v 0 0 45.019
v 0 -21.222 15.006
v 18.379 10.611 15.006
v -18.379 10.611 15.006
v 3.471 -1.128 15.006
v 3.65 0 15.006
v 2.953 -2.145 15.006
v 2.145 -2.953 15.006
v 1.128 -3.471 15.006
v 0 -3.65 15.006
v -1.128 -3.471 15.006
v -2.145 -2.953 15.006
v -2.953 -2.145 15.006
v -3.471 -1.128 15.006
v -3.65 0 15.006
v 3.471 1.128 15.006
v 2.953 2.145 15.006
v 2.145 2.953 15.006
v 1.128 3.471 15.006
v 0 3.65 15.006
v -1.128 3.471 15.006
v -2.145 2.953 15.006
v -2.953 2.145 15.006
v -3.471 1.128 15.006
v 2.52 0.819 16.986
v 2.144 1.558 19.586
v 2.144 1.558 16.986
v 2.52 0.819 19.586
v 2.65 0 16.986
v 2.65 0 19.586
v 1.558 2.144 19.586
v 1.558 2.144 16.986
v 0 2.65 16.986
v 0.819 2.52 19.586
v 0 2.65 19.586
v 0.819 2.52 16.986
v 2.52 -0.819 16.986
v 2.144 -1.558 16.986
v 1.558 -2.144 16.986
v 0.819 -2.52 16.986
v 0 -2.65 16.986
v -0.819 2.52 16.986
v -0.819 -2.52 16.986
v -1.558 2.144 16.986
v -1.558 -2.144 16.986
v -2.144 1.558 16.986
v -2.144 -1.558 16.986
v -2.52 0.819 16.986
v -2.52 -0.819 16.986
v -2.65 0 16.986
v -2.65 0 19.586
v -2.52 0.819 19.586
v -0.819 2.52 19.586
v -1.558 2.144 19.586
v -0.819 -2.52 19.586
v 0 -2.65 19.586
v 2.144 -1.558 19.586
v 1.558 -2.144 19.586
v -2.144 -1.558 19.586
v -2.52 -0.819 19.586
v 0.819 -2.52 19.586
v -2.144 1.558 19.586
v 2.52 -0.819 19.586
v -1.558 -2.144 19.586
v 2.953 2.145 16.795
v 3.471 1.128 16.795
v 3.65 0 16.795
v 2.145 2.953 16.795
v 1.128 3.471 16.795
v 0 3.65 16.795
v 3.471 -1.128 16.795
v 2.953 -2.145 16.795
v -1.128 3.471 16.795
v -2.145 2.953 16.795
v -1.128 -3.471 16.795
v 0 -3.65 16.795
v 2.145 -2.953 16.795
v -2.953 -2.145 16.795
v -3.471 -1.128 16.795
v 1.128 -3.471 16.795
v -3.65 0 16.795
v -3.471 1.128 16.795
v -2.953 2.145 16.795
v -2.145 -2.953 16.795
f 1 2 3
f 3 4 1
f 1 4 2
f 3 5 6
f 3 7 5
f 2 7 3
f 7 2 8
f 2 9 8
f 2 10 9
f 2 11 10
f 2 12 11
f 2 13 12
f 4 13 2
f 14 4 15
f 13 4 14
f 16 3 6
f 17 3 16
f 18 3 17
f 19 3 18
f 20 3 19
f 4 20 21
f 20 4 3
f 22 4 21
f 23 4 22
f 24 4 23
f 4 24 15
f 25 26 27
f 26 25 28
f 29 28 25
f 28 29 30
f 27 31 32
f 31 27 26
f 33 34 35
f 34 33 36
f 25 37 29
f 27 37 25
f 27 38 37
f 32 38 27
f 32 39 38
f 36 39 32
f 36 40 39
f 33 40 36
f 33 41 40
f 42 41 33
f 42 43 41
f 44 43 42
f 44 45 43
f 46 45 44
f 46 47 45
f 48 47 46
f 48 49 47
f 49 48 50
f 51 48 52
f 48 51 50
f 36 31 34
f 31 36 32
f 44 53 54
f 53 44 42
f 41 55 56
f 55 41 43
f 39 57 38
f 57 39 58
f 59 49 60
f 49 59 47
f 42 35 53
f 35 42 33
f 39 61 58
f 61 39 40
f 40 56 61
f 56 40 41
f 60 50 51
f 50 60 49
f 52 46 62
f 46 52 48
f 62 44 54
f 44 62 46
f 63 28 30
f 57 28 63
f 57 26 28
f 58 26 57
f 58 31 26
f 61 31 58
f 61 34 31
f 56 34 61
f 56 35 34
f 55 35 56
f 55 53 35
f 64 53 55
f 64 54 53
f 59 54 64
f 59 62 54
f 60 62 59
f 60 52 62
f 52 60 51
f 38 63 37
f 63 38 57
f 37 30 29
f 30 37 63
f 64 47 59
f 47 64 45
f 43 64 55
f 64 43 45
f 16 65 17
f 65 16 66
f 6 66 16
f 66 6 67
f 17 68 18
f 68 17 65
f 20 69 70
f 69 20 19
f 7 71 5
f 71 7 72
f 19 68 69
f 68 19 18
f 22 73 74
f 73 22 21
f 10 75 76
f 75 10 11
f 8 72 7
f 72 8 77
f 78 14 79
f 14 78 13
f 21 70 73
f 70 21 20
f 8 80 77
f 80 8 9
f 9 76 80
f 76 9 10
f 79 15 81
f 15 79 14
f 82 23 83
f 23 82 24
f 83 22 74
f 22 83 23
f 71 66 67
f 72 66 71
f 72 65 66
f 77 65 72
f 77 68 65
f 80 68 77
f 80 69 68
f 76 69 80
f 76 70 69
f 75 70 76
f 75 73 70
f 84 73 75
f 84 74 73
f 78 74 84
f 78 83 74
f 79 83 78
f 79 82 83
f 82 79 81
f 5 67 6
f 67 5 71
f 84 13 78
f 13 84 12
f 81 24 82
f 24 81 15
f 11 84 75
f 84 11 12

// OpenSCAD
magnetRadius = 2.65;
magnetHeight = 3.1;

arete = 73.515; // jeu sphère 60mm
paroi = 1.5;
echelleReductionAjustementBouchon = 0.99;
r = 0.19; // résolution d'impression sur l'axe Z
tetra_sch = [3,3];
Cpi = 3.14159;
Cphi = (1+sqrt(5))/2;
Cepsilon = 0.00000001;

function tetra_ext_radius(a) =
    a/4*sqrt(6);

function tetra_int_radius(a) =
    a/12*sqrt(6);

function tetra_arete_from(radius) =
    radius*12/sqrt(6);

externalRadius = tetra_ext_radius(arete);
internalRadius = tetra_ext_radius(
                    tetra_arete_from(
                        tetra_int_radius(arete)-paroi));

echo(externalRadius);
echo(internalRadius);

//decoupe_bouchon();
// rotate([180])
// tetra_creux();

// rotate([plat_dihedral(tetra_sch)+180])
// corps_ouvert();

// bouchon();
//trou();

// tetra_magnets();

// rotate([plat_dihedral(tetra_sch)+180])
tetra_pointe();

module tetra_pointe() {
    h = tetra_int_radius(arete);
    difference() {
        tetrahedron(externalRadius);
        translate([0, 0, -arete/2+h])
            cylinder(h=arete, r=arete, center=true, $fn=20);
        // magnet hole
        translate([0, 0, h+1.6+2*r])
            cylinder(h=magnetHeight-0.5, r=magnetRadius, center=false, $fn=20);
        // magnet cover hole
        translate([0, 0, h-0.001])
            cylinder(h=1.6+r, r=magnetRadius+1, center=false, $fn=20);
    }
}

module tetra_pointe_magnet_cap() {
        cylinder(h=1.6, r=magnetRadius+1-0.1, center=true, $fn=20);
}

module tetra_magnets() {
    // for (i = [0:1]) {
    //     rotate([0,0,60-i*120]) rotate([90-plat_dihedral(tetra_sch)])
    //         _tetra_magnet();
    // }
    rotate([0,0,180]) rotate([-90]) _tetra_magnet();
}


module _tetra_magnet() {
    translate([0, tetra_int_radius(arete)-paroi-0.5])
        rotate([90, 0]) magnet_holder();
}

module magnet_holder() {
    difference() {
        cylinder(h=1.2, r1=magnetRadius+3, r2=magnetRadius+0.4, center=true, $fn=20);
        cylinder(h=3, r=magnetRadius, center=true, $fn=20);
        translate([0,15])
            cube(size=[magnetRadius*1.6,30,6], center=true);
    }
}


module corps_ouvert() {
    difference() {
        tetra_creux();
        decoupe_bouchon();
    }
}

module bouchon() {
//    rotate([180, 0, 0])
    scale([echelleReductionAjustementBouchon, echelleReductionAjustementBouchon, 0.95])
    difference () {
        intersection() {
            tetra_creux();
            decoupe_bouchon(echelleReductionAjustementBouchon);
        }
    }
}

module tetra_creux() {
    difference() {
        tetrahedron(externalRadius);
        tetrahedron(internalRadius);
    }
}

module decoupe_bouchon(scale=1) {
    distance = tetra_int_radius(arete);
    rotate([0,0,30]) translate([0,0,-distance-2*r])
        cylinder(6*r, r=arete*0.548, $fn=3);
    rotate([0,0,30]) translate([0,0,-distance])
        cylinder(8*r, r=(arete-paroi)*0.529, $fn=3);
}


module tetrahedron(rad) {
    // create an instance of a spherical coordinate
    // long - rotation around z -axis
    // lat - latitude, starting at 0 == 'north pole'
    // rad - distance from center
    function sph(long, lat, rad=1) = [long, lat, rad];

    // Convert spherical to cartesian
    function sph_to_cart(s) = [
    clean(s[2]*sin(s[1])*cos(s[0])),

    clean(s[2]*sin(s[1])*sin(s[0])),

    clean(s[2]*cos(s[1]))
    ];

    function sphu_from_cart(c, rad=1) = sph(
        atan2(c[1],c[0]),
        atan2(sqrt(c[0]*c[0]+c[1]*c[1]), c[2]),
        rad
        );

    tetra_cart = [
        [+1, +1, +1],
        [-1, -1, +1],
        [-1, +1, -1],
        [+1, -1, -1]
    ];

    function tetra_unit(rad=1) = [
        sph_to_cart(sphu_from_cart(tetra_cart[0], rad)),
        sph_to_cart(sphu_from_cart(tetra_cart[1], rad)),
        sph_to_cart(sphu_from_cart(tetra_cart[2], rad)),
        sph_to_cart(sphu_from_cart(tetra_cart[3], rad)),
        ];


    tetrafaces = [
        [0, 3, 1],
        [0,1,2],
        [2,1,3],
        [0,2,3]
    ];

    tetra_edges = [
        [0,1],
        [0,2],
        [0,3],
        [1,2],
        [1,3],
        [2,3],
        ];

    rotate([54.735, 0, 0])
    rotate([0, 0, 45])
    polyhedron(tetra_unit(rad), faces=tetrafaces);
}
//translate([0, 0, -17.7])
//cylinder(5,40,40);

function clean(n) = (n < 0) ? ((n < -Cepsilon) ? n : 0) :
    (n < Cepsilon) ? 0 : n;

function plat_dihedral(pq) = 2 * asin( cos(180/pq[1])/sin(180/pq[0]));

function plat_circumradius(pq, a) =
    (a/2)*
    tan(Cpi/pq[1])*
    tan(plat_dihedral(pq)/2);

function plat_midradius(pq, a) =
    (a/2)*
    cos(Cpi/pq[0])*
    tan(plat_dihedral(pq)/2);

function plat_inradius(pq,a) =
    a/(2*tan(Cpi/pq[0]))*
    sqrt((1-cos(plat_dihedral(pq)))/(1+cos(plat_dihedral(pq))));

function plat_a_from_inradius(pq, inradius) =
    inradius*(2*tan(Cpi/pq[0]))/
    sqrt((1-cos(plat_dihedral(pq)))/(1+cos(plat_dihedral(pq))));
